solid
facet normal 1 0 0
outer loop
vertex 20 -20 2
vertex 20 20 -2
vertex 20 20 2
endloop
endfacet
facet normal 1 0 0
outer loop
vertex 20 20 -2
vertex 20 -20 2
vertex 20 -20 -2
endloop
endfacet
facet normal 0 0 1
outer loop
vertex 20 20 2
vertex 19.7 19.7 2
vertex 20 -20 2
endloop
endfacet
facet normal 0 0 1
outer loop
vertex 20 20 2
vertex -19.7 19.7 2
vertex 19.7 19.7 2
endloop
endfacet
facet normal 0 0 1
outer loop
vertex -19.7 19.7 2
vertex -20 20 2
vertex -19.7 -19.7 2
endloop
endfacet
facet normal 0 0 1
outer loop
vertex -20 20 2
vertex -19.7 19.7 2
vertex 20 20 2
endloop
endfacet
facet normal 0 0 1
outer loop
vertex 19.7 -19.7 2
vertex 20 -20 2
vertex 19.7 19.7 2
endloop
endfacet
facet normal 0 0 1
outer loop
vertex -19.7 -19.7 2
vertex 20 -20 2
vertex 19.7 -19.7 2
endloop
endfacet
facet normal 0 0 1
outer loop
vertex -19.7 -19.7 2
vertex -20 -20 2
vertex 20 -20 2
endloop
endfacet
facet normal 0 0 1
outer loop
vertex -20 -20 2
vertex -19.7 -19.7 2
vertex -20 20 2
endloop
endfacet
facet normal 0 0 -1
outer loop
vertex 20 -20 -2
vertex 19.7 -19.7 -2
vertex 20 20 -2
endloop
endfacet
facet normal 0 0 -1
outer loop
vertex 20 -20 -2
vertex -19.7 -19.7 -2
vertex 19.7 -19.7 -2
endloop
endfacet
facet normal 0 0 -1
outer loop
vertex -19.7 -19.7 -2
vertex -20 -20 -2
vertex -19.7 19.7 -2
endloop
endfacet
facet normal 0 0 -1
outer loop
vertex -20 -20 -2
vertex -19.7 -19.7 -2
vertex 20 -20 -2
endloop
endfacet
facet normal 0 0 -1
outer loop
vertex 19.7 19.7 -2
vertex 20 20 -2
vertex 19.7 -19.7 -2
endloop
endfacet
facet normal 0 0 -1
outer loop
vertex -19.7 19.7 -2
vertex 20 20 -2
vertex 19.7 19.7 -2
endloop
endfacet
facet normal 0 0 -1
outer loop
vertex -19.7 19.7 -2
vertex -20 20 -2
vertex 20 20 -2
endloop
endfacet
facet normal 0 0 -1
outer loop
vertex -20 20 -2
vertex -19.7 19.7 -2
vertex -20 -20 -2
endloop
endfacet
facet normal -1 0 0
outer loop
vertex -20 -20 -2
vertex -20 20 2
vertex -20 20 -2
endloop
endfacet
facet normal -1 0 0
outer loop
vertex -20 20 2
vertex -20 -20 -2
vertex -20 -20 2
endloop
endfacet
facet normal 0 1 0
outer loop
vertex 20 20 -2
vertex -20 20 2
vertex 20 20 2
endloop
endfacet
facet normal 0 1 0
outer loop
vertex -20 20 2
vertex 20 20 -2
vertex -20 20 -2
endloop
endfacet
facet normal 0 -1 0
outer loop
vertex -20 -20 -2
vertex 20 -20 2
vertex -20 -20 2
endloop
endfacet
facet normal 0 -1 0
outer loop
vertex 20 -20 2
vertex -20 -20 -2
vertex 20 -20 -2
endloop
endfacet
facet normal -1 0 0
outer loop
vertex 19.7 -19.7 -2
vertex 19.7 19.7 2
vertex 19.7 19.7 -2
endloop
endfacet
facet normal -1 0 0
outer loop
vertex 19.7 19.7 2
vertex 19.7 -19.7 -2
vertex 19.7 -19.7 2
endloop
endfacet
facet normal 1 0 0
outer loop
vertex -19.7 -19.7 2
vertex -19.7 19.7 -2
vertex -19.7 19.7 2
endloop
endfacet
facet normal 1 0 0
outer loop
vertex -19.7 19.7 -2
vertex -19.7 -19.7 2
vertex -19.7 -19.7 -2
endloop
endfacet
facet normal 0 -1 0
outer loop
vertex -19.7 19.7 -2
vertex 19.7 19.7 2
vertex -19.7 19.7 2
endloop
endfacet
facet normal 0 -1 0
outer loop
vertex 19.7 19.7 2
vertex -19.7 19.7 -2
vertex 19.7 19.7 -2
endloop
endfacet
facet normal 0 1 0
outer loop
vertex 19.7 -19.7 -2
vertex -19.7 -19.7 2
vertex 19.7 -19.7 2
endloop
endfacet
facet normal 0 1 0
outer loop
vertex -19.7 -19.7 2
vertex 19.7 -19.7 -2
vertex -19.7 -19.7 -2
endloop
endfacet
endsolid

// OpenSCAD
module wall(SIZE=20,isCircle=0)
{

wallTh = 0.3;
wallH = 4;
	if( !isCircle )
	{	
difference()
{
	cube([SIZE,SIZE,wallH],center=true);
	cube([SIZE-wallTh*2,SIZE-wallTh*2,wallH+1],center=true);
	}
}
else
{
difference()
{
	cylinder(r=SIZE,h=wallH);
	cylinder(r=SIZE-wallTh*2,h=wallH+1);
	}
}
}

wall(40,0);
